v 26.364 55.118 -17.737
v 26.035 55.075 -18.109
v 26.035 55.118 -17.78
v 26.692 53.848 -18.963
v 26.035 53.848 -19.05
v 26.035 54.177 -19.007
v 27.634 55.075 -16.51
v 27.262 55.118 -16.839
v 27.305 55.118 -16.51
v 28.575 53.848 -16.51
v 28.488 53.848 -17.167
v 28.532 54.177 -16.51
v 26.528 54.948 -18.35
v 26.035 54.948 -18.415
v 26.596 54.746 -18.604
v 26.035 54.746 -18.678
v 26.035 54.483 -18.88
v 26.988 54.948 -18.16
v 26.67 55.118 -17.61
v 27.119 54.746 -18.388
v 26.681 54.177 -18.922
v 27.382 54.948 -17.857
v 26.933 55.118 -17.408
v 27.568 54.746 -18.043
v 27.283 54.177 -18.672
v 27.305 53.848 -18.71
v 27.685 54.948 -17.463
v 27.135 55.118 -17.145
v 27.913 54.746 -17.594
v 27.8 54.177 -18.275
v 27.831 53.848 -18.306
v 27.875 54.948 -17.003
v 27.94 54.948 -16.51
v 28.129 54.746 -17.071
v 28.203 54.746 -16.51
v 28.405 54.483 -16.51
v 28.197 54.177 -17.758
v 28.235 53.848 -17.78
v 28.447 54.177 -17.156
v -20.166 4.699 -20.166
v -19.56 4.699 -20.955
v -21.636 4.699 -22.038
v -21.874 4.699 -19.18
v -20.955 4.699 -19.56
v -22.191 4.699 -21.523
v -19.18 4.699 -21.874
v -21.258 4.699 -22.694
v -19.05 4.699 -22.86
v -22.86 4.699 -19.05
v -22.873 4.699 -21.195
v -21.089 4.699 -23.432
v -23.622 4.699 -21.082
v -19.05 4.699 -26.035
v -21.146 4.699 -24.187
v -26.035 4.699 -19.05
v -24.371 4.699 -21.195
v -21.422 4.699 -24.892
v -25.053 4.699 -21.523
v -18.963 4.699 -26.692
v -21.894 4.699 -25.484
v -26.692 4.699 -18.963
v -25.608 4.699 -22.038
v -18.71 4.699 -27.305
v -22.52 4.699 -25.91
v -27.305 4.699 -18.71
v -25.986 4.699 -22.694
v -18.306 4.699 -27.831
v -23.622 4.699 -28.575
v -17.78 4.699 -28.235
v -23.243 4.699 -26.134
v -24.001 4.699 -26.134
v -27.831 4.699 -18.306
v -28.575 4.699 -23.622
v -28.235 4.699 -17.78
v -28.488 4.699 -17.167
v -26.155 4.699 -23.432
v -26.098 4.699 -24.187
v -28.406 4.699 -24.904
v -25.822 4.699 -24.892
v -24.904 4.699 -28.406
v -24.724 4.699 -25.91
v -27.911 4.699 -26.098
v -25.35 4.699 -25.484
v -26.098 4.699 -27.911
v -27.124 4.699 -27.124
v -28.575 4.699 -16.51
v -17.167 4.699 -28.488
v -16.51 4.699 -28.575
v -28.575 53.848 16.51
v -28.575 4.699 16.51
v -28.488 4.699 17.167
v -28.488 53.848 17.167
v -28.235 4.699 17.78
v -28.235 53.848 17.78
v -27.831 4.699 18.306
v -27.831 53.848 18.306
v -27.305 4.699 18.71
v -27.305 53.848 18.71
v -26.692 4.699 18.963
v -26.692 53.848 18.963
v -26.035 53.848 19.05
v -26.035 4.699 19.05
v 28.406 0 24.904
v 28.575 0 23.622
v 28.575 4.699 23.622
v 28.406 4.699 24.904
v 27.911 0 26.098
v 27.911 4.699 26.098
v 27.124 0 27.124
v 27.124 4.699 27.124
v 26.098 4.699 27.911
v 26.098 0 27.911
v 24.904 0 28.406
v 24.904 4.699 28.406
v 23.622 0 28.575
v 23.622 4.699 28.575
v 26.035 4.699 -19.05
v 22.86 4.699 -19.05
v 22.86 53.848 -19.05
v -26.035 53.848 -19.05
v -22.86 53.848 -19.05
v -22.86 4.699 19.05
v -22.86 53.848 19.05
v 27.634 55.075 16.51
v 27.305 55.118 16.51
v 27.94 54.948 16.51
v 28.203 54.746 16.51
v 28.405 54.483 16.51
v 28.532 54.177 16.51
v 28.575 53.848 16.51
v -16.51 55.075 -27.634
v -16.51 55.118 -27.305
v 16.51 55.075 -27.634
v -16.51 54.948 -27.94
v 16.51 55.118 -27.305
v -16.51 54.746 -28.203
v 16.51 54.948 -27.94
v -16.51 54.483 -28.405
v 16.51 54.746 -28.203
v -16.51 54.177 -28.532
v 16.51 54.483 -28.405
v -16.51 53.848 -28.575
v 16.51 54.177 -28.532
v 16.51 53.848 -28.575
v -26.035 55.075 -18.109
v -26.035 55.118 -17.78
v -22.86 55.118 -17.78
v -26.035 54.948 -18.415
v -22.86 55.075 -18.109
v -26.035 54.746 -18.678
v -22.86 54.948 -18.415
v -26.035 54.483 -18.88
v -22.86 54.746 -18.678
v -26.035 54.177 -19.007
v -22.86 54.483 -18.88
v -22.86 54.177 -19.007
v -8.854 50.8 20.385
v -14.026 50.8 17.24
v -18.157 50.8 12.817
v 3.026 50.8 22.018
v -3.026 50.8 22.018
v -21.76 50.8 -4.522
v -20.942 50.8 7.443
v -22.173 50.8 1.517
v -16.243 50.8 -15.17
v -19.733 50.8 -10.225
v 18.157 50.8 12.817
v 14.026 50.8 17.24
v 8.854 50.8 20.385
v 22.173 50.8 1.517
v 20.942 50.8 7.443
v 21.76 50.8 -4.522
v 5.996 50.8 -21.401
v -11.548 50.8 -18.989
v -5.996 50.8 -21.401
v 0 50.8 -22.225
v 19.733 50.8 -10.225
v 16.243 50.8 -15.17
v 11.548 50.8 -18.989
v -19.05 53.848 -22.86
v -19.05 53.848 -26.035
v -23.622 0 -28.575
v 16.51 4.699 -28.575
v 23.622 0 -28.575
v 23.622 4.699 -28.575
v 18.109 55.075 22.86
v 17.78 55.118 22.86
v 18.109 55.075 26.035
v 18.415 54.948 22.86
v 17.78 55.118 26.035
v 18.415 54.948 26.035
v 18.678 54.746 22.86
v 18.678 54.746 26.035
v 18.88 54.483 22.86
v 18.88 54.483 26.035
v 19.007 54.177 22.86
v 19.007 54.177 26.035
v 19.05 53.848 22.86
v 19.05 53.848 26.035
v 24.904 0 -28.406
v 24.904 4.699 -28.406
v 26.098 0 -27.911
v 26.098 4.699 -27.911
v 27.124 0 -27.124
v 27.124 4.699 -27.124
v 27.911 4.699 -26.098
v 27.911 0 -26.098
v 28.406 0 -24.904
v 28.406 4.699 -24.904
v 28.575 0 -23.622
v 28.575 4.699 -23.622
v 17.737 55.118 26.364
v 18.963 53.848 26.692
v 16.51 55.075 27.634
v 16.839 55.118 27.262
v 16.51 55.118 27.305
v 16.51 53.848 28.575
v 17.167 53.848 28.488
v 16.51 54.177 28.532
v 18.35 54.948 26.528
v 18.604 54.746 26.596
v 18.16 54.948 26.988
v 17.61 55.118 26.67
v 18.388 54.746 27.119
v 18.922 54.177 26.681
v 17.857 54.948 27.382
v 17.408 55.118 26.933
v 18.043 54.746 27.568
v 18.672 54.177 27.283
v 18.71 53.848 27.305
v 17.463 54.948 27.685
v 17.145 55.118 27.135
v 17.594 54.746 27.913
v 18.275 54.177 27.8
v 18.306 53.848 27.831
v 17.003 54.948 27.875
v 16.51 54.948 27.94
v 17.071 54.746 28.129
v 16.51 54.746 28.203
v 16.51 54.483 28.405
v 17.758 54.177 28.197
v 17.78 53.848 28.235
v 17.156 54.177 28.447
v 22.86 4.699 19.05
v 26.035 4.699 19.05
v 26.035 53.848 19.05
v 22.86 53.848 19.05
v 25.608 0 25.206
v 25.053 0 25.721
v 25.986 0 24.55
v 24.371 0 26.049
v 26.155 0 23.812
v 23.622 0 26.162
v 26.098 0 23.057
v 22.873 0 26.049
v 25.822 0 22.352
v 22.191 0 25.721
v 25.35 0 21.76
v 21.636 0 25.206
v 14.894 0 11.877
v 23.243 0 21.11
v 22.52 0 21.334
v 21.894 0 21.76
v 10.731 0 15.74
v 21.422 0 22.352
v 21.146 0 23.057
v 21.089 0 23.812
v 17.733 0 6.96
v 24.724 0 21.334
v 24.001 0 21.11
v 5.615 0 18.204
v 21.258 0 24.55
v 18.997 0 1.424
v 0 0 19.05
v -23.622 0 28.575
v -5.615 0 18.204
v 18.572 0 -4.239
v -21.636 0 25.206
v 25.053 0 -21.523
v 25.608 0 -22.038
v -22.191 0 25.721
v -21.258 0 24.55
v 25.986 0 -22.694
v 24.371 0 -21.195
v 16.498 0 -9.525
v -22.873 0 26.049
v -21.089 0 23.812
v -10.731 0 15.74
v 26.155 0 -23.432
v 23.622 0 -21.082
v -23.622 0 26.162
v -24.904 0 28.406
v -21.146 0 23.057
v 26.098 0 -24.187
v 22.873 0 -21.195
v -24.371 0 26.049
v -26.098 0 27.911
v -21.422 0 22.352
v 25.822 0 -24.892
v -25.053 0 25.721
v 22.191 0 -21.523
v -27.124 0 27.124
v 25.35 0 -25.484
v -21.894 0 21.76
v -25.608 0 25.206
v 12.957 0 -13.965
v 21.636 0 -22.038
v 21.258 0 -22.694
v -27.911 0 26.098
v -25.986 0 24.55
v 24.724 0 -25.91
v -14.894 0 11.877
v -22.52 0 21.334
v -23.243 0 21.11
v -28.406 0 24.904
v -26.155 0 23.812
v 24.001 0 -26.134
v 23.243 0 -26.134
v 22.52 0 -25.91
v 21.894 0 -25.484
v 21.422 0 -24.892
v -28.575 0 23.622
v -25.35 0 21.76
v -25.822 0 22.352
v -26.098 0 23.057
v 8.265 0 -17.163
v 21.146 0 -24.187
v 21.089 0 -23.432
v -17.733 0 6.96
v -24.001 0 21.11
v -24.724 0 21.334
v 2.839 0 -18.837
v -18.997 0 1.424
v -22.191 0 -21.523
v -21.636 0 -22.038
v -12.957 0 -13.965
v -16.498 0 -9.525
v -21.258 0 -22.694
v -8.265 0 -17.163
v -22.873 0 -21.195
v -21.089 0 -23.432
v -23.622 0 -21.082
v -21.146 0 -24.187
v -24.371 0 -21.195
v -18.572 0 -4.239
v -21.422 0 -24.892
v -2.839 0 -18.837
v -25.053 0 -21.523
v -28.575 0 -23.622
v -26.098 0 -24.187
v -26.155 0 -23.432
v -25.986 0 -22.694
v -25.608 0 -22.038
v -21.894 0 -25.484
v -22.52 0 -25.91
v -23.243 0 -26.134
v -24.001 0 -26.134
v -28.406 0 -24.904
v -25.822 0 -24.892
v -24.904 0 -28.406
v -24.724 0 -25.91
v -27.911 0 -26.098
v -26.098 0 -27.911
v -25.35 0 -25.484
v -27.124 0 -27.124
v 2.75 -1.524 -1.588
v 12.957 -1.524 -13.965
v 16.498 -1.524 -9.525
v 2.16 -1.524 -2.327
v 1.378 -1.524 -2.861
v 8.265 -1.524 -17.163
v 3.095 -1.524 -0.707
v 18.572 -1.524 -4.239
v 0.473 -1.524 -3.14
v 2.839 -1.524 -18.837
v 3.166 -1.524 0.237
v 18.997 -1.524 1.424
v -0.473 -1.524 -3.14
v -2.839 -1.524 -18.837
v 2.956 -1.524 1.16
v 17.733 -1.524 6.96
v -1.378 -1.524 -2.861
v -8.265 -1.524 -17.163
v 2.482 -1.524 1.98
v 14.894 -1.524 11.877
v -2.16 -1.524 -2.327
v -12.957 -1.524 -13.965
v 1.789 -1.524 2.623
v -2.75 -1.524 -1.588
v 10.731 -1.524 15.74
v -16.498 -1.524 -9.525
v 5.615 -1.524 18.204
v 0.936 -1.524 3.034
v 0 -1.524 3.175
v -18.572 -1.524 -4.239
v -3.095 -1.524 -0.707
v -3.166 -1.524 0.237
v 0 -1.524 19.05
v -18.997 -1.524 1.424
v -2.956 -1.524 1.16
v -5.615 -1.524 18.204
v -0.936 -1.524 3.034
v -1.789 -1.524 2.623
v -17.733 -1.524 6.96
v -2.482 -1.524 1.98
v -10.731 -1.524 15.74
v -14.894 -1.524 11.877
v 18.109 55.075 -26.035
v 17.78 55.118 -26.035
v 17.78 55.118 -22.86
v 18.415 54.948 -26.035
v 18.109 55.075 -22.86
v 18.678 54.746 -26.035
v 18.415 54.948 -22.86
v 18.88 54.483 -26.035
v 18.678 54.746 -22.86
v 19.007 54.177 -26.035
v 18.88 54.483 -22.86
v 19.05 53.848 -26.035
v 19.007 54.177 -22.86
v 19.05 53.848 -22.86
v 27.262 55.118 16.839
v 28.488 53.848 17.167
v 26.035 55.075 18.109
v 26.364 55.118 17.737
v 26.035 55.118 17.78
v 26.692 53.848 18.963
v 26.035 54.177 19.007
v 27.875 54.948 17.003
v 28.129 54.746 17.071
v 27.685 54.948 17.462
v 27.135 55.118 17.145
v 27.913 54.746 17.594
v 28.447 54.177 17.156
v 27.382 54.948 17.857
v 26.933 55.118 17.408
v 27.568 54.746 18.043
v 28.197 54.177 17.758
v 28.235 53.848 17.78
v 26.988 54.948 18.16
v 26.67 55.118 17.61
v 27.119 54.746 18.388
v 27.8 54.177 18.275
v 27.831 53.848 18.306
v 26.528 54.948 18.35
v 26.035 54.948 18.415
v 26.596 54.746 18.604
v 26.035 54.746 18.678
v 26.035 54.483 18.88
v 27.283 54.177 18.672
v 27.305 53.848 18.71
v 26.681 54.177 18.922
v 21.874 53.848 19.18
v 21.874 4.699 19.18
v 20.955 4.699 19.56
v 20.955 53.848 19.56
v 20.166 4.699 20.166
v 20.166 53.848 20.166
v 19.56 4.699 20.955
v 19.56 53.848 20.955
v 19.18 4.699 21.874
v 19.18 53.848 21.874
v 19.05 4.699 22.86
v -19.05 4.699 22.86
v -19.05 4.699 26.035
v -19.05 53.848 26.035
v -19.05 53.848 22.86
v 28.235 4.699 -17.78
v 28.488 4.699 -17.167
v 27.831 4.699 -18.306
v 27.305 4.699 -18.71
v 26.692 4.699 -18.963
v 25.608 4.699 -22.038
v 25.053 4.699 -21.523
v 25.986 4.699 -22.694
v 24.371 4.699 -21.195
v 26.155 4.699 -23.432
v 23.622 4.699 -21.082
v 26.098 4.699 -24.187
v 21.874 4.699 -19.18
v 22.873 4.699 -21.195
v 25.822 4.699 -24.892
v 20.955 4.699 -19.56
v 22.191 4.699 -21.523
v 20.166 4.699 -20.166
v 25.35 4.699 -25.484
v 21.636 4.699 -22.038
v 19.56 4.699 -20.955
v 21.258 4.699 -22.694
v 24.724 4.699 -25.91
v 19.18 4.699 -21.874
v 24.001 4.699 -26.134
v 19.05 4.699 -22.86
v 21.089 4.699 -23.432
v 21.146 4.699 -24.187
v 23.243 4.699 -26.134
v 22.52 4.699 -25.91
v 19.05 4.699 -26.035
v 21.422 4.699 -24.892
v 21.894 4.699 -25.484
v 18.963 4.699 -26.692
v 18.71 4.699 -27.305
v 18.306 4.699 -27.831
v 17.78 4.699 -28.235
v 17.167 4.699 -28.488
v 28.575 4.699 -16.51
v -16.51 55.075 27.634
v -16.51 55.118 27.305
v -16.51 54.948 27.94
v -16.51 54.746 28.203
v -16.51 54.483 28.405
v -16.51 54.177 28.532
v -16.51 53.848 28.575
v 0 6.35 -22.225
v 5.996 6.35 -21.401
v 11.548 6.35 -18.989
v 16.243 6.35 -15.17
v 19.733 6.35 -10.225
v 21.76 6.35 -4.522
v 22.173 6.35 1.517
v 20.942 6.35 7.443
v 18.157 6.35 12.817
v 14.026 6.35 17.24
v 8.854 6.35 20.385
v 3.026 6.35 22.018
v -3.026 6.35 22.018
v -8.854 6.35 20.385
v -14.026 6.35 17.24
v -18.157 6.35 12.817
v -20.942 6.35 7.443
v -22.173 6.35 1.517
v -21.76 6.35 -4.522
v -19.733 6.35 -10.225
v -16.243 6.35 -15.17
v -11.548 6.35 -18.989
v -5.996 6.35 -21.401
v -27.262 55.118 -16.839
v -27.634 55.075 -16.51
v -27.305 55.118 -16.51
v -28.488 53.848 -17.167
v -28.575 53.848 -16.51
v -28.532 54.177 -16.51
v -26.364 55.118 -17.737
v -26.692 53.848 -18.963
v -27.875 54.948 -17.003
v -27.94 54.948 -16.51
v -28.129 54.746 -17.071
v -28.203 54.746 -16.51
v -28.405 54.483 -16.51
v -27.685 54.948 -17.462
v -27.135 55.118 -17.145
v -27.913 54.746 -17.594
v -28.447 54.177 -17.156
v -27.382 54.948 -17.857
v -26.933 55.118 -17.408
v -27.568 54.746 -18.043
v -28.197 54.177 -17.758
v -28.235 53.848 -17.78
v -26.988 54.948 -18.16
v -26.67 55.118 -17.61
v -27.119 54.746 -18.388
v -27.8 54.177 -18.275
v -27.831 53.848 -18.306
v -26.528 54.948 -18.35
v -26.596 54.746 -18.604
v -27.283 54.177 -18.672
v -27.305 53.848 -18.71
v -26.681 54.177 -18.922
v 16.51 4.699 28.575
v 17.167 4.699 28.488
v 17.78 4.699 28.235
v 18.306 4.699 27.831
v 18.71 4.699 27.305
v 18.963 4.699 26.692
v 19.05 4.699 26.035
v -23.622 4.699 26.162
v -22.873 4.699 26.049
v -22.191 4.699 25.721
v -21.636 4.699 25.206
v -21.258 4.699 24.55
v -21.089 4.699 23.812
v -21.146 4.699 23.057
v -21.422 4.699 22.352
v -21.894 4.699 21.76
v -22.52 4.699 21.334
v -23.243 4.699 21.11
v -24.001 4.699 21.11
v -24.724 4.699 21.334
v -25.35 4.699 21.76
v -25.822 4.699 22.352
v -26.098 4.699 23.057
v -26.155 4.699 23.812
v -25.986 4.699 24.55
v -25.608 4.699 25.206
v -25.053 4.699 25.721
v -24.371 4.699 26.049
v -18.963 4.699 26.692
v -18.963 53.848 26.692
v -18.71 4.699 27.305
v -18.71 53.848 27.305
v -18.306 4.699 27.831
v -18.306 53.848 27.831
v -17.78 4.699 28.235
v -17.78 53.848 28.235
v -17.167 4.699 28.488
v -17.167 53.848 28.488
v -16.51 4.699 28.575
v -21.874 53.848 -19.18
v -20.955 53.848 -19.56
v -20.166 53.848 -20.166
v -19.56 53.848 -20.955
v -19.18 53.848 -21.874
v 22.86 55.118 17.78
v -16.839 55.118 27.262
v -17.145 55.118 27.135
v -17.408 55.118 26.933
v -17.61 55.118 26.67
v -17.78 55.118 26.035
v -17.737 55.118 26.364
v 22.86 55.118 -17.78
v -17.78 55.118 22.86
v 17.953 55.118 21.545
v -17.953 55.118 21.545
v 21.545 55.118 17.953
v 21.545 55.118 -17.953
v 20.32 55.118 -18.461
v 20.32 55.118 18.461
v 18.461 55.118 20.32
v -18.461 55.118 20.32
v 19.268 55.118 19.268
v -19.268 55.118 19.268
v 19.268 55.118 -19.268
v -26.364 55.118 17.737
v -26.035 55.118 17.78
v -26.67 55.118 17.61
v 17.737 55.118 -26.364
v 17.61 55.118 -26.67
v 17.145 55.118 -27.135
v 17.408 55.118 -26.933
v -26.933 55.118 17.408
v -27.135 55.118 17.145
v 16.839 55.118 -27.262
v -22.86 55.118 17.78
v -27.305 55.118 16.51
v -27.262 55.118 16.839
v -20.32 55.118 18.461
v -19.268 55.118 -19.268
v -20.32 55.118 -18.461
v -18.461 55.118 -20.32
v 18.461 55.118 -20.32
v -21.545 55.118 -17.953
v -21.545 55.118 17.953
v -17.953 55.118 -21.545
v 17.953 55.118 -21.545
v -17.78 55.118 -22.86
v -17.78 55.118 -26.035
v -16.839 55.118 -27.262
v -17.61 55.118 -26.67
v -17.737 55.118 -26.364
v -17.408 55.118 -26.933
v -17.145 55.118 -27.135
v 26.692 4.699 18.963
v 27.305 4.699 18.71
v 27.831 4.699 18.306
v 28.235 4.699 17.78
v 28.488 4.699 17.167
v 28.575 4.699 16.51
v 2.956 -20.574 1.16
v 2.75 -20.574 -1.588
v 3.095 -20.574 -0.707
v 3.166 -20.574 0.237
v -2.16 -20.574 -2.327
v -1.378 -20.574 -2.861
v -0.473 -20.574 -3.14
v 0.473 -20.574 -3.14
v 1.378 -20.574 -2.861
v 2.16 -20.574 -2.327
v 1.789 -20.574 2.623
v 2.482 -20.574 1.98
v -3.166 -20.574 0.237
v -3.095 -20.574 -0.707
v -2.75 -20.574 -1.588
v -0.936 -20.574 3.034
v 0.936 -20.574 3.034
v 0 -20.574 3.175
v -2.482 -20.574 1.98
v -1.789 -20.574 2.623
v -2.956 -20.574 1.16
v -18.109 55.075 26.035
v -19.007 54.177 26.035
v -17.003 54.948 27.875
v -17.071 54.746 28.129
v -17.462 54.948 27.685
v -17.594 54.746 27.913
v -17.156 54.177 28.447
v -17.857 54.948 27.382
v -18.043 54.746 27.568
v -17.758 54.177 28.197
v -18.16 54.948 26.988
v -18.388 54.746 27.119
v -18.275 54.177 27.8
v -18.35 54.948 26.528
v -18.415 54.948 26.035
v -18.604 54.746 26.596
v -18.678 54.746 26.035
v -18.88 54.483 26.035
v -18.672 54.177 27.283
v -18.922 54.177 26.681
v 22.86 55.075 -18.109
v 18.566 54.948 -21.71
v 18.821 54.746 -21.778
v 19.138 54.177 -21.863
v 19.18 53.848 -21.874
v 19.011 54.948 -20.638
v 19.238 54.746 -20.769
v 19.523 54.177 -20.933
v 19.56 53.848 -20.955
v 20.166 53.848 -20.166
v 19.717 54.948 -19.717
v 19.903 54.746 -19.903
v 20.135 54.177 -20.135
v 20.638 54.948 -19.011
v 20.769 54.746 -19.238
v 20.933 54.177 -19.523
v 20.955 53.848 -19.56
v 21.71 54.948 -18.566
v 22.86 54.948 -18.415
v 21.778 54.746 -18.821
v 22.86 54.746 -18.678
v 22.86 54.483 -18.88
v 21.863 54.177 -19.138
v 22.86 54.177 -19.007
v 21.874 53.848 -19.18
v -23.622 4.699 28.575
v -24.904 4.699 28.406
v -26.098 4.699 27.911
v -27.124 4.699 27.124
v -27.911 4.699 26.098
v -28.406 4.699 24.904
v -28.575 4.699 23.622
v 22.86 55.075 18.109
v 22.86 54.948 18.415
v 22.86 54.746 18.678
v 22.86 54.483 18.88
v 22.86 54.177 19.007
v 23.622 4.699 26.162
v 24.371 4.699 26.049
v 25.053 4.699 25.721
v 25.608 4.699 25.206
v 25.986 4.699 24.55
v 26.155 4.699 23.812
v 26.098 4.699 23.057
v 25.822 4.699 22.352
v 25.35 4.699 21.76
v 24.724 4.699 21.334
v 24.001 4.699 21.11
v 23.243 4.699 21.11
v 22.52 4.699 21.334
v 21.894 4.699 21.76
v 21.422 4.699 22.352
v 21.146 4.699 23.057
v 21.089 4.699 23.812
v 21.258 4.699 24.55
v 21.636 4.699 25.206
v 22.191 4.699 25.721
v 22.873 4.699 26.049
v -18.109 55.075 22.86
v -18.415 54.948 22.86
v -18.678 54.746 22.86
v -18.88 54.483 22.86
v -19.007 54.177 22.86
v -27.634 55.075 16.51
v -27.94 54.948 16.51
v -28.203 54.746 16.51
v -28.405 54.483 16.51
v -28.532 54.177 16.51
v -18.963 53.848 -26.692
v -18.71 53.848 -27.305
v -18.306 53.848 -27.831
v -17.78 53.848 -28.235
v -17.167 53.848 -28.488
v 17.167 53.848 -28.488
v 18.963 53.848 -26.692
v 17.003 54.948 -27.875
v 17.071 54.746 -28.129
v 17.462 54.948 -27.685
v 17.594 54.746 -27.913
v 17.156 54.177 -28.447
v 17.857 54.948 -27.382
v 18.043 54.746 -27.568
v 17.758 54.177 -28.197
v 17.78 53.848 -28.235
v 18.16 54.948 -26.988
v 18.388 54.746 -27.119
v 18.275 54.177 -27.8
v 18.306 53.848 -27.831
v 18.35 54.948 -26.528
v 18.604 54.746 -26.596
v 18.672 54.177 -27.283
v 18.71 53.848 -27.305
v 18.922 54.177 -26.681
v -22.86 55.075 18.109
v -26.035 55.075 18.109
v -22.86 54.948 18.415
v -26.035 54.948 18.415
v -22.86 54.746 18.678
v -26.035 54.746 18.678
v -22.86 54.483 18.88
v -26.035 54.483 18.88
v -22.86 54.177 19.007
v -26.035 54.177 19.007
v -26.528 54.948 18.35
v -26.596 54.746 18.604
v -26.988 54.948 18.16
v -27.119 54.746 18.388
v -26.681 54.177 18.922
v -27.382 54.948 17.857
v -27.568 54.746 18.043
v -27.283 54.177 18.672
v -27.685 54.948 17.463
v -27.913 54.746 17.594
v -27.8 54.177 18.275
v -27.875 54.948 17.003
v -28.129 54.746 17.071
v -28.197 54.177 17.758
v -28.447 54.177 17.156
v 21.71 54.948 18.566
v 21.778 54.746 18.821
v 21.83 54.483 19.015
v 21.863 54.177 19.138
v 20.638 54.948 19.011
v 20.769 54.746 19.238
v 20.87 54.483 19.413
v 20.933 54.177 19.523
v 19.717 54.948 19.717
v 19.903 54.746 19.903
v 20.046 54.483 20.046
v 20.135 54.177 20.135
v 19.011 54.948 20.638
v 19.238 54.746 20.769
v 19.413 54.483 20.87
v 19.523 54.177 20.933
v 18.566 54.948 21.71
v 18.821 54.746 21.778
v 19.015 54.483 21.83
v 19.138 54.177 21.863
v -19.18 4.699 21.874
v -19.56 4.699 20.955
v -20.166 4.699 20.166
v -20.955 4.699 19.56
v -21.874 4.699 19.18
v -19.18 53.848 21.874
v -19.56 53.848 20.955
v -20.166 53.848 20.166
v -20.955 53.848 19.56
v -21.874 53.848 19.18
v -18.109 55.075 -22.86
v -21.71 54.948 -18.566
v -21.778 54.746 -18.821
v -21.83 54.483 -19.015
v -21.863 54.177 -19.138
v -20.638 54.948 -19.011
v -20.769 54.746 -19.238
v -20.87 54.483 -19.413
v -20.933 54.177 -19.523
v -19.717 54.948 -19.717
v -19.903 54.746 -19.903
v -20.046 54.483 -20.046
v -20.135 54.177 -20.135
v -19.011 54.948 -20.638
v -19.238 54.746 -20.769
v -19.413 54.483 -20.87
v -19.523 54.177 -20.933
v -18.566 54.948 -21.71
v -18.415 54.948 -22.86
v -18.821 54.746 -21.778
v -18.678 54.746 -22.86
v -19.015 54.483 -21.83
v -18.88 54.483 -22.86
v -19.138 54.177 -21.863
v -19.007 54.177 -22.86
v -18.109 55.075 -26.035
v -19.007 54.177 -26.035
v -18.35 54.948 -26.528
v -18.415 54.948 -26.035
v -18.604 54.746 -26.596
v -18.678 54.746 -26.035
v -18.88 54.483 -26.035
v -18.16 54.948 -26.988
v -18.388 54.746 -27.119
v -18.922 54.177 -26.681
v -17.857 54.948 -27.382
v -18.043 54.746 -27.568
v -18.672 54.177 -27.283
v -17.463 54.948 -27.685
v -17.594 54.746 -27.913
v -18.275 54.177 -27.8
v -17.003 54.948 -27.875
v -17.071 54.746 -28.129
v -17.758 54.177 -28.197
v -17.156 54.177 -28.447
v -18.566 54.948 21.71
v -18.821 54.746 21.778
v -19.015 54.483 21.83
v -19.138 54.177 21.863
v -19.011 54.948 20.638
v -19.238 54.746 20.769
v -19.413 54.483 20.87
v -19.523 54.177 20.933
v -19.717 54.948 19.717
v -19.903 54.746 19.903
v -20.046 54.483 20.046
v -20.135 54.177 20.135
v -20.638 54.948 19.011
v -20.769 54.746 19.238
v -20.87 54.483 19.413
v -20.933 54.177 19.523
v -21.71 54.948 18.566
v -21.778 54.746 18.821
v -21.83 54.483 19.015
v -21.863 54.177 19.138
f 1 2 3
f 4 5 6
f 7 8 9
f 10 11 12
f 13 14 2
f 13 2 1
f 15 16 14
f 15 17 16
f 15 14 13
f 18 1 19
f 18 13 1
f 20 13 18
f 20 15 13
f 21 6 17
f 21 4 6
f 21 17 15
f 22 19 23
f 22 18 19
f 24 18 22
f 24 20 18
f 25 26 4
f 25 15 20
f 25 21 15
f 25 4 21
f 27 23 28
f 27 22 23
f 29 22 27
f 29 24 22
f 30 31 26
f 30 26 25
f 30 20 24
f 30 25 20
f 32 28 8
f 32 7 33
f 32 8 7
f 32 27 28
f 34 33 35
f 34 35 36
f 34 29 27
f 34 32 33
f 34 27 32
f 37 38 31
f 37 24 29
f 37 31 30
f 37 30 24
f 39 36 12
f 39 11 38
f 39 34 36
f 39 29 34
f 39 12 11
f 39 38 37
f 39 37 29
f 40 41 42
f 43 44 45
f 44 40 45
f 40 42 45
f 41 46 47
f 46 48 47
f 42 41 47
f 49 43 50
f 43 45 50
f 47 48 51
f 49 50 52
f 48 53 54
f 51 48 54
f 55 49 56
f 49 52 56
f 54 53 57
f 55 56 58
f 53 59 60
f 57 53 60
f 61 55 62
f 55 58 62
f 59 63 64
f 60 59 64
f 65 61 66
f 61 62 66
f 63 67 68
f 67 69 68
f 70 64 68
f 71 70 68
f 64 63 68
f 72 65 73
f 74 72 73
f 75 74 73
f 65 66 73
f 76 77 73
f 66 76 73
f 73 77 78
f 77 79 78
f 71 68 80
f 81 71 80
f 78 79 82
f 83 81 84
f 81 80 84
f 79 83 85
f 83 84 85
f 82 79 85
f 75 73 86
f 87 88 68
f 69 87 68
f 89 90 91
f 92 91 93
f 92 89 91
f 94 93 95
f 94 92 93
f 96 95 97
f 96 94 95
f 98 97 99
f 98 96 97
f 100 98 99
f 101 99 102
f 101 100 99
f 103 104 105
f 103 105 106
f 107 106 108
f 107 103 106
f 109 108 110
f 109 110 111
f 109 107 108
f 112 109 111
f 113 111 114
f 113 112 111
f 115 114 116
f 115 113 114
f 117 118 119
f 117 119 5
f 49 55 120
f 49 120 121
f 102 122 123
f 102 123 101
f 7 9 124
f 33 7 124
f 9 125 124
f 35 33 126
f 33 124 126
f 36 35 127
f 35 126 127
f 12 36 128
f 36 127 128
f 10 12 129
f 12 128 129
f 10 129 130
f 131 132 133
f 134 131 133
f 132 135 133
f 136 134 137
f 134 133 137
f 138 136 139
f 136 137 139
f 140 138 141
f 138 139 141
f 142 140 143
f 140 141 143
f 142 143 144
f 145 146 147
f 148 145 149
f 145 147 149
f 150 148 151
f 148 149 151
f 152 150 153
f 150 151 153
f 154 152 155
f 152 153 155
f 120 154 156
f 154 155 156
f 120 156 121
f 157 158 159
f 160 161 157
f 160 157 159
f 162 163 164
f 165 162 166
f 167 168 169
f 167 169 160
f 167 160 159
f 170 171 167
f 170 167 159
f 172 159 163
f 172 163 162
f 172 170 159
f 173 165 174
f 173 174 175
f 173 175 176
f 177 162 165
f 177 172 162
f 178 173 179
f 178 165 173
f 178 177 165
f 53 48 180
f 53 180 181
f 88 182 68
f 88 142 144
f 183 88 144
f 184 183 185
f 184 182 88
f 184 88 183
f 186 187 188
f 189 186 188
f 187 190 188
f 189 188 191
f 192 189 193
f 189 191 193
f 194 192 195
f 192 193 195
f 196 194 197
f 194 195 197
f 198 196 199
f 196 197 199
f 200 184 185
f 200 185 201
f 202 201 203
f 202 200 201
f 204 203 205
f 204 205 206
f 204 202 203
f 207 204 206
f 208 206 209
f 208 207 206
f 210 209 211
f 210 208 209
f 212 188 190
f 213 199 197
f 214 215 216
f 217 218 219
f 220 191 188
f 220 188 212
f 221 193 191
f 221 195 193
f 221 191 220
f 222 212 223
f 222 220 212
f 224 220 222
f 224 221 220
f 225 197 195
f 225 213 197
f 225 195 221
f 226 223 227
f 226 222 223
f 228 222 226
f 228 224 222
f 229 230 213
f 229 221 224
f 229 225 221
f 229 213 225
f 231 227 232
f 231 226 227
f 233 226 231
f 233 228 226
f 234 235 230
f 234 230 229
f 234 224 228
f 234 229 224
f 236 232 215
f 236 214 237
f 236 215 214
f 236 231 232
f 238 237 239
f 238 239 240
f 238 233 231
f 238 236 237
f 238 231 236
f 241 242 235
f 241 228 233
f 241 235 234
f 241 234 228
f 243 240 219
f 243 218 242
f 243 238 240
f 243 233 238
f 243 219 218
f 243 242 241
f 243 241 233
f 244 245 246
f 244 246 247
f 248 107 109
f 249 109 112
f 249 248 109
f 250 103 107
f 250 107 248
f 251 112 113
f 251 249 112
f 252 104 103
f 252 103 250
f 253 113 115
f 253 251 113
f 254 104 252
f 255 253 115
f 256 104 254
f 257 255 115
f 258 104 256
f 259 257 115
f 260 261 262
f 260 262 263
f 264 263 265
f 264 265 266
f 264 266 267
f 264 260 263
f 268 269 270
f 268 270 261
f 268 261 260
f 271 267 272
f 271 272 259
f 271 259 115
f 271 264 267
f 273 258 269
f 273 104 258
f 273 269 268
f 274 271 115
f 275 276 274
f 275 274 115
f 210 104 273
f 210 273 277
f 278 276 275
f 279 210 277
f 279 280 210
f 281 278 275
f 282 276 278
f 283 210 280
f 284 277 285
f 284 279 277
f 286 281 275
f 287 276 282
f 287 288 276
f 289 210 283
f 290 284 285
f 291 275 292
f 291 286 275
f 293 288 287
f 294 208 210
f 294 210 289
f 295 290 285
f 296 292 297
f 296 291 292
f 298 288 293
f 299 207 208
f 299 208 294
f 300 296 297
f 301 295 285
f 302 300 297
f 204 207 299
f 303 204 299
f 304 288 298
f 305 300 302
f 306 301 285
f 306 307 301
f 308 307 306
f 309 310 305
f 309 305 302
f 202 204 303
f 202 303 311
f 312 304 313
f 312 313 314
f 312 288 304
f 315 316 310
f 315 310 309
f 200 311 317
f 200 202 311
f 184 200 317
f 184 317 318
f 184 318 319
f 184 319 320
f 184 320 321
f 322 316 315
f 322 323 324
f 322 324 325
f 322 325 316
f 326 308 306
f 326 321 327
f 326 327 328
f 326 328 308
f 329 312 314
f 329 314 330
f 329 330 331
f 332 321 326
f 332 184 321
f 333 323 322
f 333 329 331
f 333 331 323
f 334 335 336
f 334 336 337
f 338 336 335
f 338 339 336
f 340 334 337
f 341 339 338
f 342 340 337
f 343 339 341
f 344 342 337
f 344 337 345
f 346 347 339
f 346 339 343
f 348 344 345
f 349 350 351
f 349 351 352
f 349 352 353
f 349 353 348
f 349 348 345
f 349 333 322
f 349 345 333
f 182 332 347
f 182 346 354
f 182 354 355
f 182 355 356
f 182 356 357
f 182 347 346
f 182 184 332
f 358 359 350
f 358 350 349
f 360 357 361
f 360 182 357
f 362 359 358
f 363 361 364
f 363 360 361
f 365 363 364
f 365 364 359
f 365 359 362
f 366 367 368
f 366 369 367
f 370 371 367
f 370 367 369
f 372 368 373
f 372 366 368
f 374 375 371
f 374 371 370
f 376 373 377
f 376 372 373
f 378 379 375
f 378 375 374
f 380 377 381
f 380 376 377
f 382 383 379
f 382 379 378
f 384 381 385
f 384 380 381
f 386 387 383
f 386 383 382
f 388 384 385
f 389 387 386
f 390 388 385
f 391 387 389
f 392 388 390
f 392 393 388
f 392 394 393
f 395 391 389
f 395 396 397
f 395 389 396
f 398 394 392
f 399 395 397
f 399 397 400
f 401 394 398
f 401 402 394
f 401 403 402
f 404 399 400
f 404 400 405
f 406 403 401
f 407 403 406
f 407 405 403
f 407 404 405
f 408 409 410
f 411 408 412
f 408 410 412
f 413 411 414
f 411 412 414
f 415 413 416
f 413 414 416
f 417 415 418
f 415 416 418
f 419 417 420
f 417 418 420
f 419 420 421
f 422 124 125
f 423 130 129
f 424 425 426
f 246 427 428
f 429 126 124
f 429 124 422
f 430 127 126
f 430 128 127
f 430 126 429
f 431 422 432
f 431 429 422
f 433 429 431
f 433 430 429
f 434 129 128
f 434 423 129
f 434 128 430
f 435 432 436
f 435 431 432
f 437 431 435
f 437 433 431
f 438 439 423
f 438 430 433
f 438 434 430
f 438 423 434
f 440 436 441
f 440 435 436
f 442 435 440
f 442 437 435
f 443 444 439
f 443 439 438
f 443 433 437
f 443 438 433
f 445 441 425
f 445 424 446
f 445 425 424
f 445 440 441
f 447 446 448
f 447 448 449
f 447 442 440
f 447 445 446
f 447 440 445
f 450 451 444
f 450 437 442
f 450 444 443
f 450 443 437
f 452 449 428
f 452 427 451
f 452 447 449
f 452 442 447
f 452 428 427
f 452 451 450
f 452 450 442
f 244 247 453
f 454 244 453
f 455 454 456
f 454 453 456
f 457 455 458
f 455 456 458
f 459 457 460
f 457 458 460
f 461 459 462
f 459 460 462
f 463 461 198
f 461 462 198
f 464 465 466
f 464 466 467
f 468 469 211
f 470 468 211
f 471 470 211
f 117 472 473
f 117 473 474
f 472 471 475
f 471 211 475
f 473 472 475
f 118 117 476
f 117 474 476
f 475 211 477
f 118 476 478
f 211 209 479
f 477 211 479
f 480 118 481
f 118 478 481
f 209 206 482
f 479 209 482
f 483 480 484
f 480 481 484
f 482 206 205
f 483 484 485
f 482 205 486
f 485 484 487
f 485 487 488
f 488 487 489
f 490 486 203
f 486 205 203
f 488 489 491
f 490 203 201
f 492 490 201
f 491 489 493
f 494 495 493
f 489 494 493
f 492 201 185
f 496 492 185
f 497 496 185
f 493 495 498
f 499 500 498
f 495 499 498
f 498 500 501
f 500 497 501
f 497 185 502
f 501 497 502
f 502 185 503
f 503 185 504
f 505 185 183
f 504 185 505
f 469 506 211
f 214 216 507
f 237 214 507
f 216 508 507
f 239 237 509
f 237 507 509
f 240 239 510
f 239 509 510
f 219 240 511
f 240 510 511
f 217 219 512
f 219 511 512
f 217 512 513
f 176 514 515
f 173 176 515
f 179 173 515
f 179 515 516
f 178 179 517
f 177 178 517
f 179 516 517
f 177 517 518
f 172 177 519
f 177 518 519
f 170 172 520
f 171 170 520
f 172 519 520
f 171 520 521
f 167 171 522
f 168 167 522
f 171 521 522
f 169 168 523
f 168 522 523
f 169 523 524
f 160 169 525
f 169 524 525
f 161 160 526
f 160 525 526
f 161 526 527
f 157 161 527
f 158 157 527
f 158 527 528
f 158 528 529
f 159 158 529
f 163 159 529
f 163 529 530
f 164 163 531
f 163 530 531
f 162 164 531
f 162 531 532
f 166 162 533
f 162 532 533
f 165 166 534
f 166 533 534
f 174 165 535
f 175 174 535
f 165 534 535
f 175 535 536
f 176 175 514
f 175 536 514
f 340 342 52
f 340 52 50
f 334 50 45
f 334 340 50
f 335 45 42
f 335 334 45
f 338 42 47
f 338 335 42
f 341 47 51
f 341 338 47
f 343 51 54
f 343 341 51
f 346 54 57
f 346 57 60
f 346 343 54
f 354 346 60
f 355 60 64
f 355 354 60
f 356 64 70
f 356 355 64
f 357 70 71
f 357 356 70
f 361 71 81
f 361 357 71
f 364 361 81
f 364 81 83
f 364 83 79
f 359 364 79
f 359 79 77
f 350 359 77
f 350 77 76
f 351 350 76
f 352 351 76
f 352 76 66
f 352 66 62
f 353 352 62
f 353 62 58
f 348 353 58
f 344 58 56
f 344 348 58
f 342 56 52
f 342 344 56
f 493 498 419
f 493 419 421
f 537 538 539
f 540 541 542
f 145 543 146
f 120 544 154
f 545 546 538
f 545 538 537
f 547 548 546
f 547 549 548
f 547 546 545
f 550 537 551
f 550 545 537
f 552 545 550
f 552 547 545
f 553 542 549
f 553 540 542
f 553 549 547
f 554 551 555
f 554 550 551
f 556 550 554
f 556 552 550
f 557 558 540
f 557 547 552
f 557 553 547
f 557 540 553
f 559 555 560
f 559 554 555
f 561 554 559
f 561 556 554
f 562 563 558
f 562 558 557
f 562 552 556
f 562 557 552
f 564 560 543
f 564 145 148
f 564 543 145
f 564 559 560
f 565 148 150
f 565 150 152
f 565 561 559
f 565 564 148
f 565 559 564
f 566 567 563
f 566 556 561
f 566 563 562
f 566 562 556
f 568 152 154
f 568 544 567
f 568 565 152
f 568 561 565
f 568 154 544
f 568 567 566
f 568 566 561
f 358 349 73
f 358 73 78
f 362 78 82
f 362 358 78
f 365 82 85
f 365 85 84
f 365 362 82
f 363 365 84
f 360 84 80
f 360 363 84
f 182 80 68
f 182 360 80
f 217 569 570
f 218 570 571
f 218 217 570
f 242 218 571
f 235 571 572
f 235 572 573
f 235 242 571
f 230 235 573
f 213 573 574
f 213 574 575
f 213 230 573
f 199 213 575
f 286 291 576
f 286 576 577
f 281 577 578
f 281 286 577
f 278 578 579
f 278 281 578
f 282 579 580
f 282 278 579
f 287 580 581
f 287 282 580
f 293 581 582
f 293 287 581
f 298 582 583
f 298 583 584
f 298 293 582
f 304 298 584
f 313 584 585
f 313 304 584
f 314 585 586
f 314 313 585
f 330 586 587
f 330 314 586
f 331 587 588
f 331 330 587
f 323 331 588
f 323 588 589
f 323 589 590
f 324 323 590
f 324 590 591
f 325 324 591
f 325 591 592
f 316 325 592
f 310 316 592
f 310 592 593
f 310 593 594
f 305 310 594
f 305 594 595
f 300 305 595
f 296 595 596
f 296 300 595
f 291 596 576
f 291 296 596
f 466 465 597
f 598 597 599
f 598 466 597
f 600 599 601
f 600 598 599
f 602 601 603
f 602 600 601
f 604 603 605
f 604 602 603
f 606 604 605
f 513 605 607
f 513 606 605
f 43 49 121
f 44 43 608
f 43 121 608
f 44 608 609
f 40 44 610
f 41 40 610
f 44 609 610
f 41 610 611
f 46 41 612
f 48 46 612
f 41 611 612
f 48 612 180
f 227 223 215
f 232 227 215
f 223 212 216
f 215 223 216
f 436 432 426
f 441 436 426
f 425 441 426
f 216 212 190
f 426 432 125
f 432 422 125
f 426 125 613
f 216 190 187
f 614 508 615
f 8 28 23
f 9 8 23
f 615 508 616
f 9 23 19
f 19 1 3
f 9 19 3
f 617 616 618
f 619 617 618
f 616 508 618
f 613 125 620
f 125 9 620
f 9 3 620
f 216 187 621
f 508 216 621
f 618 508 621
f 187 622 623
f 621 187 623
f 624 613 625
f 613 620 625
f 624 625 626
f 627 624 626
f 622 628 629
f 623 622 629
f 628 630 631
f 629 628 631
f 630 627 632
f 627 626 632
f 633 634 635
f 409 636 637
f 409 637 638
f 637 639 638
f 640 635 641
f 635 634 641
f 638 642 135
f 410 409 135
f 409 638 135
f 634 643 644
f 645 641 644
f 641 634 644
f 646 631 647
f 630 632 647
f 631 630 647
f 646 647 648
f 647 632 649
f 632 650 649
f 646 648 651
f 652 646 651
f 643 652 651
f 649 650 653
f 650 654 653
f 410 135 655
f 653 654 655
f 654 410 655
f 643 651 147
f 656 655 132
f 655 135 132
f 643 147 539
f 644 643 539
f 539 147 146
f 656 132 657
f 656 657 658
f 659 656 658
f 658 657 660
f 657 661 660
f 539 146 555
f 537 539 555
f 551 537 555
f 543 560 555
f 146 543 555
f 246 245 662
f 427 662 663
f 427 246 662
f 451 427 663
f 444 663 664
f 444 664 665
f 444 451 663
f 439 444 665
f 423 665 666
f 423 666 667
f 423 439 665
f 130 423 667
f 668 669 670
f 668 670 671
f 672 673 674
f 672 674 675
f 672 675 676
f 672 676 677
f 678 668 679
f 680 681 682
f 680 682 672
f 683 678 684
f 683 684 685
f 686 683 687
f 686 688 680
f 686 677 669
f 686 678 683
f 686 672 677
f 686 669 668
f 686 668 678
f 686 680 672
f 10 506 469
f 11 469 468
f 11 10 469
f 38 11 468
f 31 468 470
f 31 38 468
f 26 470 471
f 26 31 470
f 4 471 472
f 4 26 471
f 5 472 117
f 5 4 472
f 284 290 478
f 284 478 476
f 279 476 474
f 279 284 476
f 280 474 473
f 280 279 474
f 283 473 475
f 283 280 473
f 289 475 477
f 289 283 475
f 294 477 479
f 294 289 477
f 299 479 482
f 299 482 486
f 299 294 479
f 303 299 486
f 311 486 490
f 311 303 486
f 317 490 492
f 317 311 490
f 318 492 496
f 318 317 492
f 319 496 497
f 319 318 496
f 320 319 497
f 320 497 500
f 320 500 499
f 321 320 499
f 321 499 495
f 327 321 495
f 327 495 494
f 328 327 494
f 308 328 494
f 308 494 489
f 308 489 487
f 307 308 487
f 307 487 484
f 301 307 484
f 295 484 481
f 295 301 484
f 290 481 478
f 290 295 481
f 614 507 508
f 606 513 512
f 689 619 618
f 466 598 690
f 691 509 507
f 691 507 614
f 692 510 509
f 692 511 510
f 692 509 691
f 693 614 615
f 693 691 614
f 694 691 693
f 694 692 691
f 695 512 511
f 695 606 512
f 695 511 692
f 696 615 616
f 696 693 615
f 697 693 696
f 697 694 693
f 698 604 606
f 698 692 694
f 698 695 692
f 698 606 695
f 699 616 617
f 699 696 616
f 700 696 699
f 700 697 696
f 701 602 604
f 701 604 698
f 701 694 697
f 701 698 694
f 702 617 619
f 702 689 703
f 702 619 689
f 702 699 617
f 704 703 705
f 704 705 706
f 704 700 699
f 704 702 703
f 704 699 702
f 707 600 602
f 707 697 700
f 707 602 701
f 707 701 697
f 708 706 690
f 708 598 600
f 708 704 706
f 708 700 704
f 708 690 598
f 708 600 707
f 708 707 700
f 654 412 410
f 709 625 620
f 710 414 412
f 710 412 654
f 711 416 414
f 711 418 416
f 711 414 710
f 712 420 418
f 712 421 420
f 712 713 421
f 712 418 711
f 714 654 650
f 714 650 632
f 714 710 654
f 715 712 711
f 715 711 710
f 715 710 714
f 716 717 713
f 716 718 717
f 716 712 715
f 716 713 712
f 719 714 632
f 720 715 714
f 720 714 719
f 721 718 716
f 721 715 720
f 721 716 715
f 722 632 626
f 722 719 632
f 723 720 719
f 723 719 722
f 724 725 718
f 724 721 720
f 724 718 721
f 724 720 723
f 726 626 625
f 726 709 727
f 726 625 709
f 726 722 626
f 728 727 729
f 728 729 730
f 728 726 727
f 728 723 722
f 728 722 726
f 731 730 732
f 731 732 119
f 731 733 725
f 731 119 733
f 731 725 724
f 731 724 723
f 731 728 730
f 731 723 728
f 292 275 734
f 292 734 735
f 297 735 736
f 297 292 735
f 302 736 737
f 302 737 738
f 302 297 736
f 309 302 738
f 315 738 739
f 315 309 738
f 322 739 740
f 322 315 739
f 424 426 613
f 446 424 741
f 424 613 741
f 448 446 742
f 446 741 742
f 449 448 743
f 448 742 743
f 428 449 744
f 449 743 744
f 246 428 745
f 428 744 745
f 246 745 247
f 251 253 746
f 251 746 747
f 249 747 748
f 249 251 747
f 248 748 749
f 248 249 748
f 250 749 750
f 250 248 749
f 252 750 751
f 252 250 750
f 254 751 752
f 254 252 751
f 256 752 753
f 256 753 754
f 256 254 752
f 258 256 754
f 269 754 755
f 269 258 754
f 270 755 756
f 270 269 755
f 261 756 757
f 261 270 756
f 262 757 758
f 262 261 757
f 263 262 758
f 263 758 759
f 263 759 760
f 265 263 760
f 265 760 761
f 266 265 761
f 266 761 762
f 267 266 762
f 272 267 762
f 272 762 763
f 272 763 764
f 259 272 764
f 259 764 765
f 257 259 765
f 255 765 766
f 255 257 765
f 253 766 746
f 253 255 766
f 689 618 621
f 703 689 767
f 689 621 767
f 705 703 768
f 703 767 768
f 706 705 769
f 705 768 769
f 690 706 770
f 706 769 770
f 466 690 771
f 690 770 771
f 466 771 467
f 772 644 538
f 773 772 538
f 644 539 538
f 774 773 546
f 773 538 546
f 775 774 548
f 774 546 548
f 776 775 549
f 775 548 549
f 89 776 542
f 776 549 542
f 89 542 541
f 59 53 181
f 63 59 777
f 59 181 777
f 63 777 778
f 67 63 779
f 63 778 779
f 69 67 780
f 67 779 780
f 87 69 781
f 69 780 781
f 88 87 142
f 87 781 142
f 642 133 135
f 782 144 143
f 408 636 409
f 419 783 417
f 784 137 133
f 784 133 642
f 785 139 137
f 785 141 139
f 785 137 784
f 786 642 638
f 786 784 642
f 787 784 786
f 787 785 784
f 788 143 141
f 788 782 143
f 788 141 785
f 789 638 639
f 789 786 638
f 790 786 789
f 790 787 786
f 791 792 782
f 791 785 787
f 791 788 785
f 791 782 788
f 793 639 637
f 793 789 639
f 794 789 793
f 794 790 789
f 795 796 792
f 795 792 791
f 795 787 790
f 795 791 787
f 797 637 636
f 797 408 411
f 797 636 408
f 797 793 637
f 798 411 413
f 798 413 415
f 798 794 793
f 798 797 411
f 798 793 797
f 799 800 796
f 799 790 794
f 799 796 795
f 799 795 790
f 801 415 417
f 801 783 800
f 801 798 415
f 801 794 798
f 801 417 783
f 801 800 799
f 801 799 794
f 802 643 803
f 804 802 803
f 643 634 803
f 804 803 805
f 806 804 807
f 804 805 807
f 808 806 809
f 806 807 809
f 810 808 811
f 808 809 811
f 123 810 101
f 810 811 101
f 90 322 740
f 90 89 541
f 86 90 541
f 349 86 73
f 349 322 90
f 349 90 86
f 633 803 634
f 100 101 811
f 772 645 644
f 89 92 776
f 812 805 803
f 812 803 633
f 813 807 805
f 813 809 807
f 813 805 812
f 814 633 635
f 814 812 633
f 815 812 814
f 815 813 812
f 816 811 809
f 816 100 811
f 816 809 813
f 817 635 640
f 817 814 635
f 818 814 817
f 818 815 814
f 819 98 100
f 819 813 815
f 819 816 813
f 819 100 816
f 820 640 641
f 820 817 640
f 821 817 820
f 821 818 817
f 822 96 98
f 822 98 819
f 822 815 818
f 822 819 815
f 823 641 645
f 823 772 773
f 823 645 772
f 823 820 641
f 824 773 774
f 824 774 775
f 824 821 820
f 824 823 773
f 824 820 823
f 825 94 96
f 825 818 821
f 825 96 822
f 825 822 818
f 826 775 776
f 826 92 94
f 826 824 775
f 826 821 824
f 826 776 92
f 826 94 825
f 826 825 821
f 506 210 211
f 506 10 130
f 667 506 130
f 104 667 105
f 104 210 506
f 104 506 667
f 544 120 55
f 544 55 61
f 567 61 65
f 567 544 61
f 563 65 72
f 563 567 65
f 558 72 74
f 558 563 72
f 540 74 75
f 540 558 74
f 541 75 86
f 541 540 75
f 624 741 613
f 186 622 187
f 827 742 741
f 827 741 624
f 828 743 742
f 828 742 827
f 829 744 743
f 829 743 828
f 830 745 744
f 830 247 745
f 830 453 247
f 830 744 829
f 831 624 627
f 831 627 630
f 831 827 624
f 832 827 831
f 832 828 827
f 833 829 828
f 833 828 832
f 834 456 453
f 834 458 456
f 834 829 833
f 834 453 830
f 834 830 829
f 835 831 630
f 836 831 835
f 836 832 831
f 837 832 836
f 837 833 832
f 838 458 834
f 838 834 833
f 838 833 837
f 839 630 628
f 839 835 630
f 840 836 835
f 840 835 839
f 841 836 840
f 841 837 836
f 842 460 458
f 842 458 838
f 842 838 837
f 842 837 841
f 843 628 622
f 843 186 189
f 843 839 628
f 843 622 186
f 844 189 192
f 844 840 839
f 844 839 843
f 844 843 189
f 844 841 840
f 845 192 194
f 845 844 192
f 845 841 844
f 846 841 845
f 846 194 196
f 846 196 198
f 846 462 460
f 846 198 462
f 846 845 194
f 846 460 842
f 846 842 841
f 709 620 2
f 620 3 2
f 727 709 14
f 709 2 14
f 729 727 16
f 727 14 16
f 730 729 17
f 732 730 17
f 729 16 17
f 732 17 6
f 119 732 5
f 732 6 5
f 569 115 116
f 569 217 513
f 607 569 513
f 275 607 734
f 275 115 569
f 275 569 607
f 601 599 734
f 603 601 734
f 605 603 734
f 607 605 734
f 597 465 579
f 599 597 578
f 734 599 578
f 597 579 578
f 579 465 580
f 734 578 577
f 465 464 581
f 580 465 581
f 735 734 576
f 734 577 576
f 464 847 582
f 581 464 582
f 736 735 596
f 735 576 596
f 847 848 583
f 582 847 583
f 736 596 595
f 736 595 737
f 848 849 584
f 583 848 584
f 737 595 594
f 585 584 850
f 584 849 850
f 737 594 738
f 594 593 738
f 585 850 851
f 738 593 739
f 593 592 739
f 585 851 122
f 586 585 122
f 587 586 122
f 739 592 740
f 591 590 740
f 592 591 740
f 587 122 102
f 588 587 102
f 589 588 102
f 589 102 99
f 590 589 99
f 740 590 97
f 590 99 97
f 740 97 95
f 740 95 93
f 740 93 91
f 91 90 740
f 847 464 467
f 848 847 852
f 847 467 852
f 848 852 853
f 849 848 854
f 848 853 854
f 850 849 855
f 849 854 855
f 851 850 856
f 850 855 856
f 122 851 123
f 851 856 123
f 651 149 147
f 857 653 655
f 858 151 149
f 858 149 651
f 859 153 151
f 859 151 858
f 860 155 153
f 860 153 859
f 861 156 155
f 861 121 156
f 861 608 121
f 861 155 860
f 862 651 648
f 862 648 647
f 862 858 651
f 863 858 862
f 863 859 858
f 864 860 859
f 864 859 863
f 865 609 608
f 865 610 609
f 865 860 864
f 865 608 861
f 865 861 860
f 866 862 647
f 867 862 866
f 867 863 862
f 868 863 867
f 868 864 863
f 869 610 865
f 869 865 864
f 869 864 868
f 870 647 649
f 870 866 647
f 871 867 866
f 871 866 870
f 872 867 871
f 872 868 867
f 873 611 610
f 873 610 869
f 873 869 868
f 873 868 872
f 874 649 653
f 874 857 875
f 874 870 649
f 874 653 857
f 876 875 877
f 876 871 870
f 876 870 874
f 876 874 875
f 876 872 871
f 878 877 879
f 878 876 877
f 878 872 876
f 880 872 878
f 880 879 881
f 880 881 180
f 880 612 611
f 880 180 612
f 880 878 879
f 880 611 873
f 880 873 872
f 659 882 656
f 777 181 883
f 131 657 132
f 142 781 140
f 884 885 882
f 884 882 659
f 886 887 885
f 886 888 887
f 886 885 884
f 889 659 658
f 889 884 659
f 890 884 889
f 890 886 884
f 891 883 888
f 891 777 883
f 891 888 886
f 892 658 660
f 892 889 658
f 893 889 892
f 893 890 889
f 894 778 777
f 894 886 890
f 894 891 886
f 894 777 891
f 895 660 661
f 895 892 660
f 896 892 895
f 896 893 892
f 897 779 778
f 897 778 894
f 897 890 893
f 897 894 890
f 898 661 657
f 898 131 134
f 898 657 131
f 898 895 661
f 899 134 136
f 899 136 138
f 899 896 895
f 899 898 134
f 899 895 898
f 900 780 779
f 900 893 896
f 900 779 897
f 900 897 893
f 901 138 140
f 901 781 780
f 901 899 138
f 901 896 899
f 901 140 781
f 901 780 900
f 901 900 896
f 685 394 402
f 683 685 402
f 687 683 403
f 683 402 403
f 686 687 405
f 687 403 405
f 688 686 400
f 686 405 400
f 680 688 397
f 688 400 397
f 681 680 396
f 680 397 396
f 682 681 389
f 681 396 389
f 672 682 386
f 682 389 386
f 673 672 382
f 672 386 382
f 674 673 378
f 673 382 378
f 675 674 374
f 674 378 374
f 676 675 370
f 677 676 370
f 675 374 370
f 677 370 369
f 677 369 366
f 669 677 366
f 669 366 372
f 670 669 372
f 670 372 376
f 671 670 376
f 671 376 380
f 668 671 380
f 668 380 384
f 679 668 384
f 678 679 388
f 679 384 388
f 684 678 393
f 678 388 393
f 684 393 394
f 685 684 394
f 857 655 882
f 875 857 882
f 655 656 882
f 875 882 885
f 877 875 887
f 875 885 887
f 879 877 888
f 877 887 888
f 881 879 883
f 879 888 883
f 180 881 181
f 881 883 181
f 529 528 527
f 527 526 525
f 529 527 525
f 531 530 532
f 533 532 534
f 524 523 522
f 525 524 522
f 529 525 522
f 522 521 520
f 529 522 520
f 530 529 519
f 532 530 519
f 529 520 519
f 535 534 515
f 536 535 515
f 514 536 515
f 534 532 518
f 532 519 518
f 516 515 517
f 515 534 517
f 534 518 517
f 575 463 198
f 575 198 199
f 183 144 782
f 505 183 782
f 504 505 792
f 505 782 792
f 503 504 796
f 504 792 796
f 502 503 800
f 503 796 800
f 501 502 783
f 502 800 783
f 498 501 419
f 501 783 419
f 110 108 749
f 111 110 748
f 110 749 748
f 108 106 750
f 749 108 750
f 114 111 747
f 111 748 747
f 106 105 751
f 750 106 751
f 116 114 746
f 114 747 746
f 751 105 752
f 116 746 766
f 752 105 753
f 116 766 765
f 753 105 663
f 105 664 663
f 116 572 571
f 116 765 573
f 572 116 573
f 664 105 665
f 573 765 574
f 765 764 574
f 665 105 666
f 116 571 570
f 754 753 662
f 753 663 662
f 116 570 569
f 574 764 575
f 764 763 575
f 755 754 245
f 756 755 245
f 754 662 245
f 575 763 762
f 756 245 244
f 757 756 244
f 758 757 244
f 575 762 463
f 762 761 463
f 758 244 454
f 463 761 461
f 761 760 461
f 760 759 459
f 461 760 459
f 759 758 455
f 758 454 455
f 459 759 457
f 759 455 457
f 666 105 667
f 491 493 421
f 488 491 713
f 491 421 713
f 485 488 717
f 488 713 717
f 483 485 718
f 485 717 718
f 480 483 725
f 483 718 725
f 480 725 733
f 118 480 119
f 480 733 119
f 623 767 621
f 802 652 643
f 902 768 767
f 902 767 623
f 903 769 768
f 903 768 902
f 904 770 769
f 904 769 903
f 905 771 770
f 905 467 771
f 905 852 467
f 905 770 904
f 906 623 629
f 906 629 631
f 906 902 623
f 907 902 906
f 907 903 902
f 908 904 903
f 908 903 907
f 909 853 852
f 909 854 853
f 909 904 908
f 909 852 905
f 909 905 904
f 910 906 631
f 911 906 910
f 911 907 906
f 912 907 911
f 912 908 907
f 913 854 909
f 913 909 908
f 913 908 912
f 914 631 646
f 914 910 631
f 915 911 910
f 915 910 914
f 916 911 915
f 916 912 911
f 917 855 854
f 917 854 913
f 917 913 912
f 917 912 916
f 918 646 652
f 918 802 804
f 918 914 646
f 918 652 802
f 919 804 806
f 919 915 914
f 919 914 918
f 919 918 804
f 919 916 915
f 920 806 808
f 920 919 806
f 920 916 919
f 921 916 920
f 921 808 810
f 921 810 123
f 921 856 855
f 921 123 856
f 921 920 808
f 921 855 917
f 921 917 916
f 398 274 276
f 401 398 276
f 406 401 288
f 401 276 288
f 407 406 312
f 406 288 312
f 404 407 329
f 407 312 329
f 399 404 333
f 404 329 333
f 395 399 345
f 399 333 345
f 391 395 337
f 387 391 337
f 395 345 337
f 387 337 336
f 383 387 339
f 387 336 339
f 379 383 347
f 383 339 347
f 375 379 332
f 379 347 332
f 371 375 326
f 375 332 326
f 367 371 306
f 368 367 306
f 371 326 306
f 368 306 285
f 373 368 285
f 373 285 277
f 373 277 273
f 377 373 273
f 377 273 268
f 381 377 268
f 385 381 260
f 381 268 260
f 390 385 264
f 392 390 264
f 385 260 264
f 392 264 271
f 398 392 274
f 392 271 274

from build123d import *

# Parameters (mm, degrees)
SKETCH1_R           = 2.54
BOSS_EXTRUDE1_DEPTH = 4.699
BOSS_EXTRUDE2_DEPTH = 50.419
FILLET1_R           = 3.81
FILLET2_R           = 2.54
FILLET3_R           = 1.27
SKETCH3_R           = 19.05
BOSS_EXTRUDE3_DEPTH = 1.524
CUT_EXTRUDE1_START  = -6.35
SKETCH5_R           = 22.225
CUT_EXTRUDE1_DEPTH  = 44.45
SKETCH4_R           = 3.175
BOSS_EXTRUDE4_DEPTH = 19.05


with BuildPart() as part:
    # Sketch1 → Boss-Extrude1 (new body)
    with BuildSketch(Plane(origin=(0, 0, 0), x_dir=(1, 0, 0), z_dir=(0, 1, 0))):
        with BuildLine():
            Line((-23.622, 28.575), (23.622, 28.575))
            ThreePointArc((23.622, 28.575), (27.124299887, 27.124299887), (28.575, 23.622))
            Line((28.575, 23.622), (28.575, -23.622))
            ThreePointArc((28.575, -23.622), (27.124299887, -27.124299887), (23.622, -28.575))
            Line((23.622, -28.575), (-23.622, -28.575))
            ThreePointArc((-23.622, -28.575), (-27.124299887, -27.124299887), (-28.575, -23.622))
            Line((-28.575, -23.622), (-28.575, 23.622))
            ThreePointArc((-28.575, 23.622), (-27.124299887, 27.124299887), (-23.622, 28.575))
        make_face()
        with Locations(Location((-23.622, 23.622, 0), (0, 0, 270))):
            Circle(SKETCH1_R, mode=Mode.SUBTRACT)
        with Locations(Location((23.622, 23.622, 0), (0, 0, 270))):
            Circle(SKETCH1_R, mode=Mode.SUBTRACT)
        with Locations(Location((23.622, -23.622, 0), (0, 0, 270))):
            Circle(SKETCH1_R, mode=Mode.SUBTRACT)
        with Locations(Location((-23.622, -23.622, 0), (0, 0, 270))):
            Circle(SKETCH1_R, mode=Mode.SUBTRACT)
    extrude(amount=BOSS_EXTRUDE1_DEPTH)

    # Sketch2 → Boss-Extrude2 (add)
    with BuildSketch(Plane(origin=(0, 4.699, 0), x_dir=(1, 0, 0), z_dir=(0, 1, 0))):
        Polygon((-19.05, -28.575), (-19.05, -19.05), (-28.575, -19.05), (-28.575, 19.05), (-19.05, 19.05), (-19.05, 28.575), (19.05, 28.575), (19.05, 19.05), (28.575, 19.05), (28.575, -19.05), (19.05, -19.05), (19.05, -28.575), align=None)
    extrude(amount=BOSS_EXTRUDE2_DEPTH)

    # Fillet1
    fillet1_edges = [part.edges().sort_by_distance(p)[0] for p in [
        (-19.05, 29.9085, 19.05),
        (-19.05, 29.9085, -19.05),
        (19.05, 29.9085, -19.05),
        (19.05, 29.9085, 19.05),
    ]]
    fillet(fillet1_edges, radius=FILLET1_R)

    # Fillet2
    fillet2_edges = [part.edges().sort_by_distance(p)[0] for p in [
        (28.575, 29.9085, -19.05),
        (19.05, 29.9085, -28.575),
        (28.575, 29.9085, 19.05),
        (-19.05, 29.9085, -28.575),
        (-28.575, 29.9085, -19.05),
        (-19.05, 29.9085, 28.575),
        (-28.575, 29.9085, 19.05),
        (19.05, 29.9085, 28.575),
    ]]
    fillet(fillet2_edges, radius=FILLET2_R)

    # Fillet3
    fillet3_edges = [part.edges().sort_by_distance(p)[0] for p in [
        (24.4475, 55.118, -19.05),
        (28.575, 55.118, 0),
        (0, 55.118, 28.575),
        (19.05, 55.118, 24.4475),
        (0, 55.118, -28.575),
        (-19.05, 55.118, -24.4475),
        (-28.575, 55.118, 0),
        (-24.4475, 55.118, 19.05),
        (18.306051224, 55.118, 27.831051224),
        (-27.831051224, 55.118, 18.306051224),
        (-18.306051224, 55.118, 27.831051224),
        (-27.831051224, 55.118, -18.306051224),
        (-18.306051224, 55.118, -27.831051224),
        (27.831051224, 55.118, 18.306051224),
        (18.306051224, 55.118, -27.831051224),
        (27.831051224, 55.118, -18.306051224),
        (-19.05, 55.118, 24.4475),
        (-24.4475, 55.118, -19.05),
        (19.05, 55.118, -24.4475),
        (24.4475, 55.118, 19.05),
        (-20.165923164, 55.118, 20.165923164),
        (-20.165923164, 55.118, -20.165923164),
        (20.165923164, 55.118, -20.165923164),
        (20.165923164, 55.118, 20.165923164),
    ]]
    fillet(fillet3_edges, radius=FILLET3_R)

    # Sketch3 → Boss-Extrude3 (add)
    with BuildSketch(Plane.XZ):
        with Locations(Location((0, 0, 0), (0, 0, 90))):
            Circle(SKETCH3_R)
    extrude(amount=BOSS_EXTRUDE3_DEPTH)

    # Sketch5 → Cut-Extrude1 (cut)
    with BuildSketch(Plane.XZ.offset(CUT_EXTRUDE1_START)):
        with Locations(Location((0, 0, 0), (0, 0, 270))):
            Circle(SKETCH5_R)
    extrude(amount=-CUT_EXTRUDE1_DEPTH, mode=Mode.SUBTRACT)

    # Sketch4 → Boss-Extrude4 (add)
    with BuildSketch(Plane.XZ.offset(1.524)):
        with Locations(Location((0, 0, 0), (0, 0, 90))):
            Circle(SKETCH4_R)
    extrude(amount=BOSS_EXTRUDE4_DEPTH)


solid = part.part
